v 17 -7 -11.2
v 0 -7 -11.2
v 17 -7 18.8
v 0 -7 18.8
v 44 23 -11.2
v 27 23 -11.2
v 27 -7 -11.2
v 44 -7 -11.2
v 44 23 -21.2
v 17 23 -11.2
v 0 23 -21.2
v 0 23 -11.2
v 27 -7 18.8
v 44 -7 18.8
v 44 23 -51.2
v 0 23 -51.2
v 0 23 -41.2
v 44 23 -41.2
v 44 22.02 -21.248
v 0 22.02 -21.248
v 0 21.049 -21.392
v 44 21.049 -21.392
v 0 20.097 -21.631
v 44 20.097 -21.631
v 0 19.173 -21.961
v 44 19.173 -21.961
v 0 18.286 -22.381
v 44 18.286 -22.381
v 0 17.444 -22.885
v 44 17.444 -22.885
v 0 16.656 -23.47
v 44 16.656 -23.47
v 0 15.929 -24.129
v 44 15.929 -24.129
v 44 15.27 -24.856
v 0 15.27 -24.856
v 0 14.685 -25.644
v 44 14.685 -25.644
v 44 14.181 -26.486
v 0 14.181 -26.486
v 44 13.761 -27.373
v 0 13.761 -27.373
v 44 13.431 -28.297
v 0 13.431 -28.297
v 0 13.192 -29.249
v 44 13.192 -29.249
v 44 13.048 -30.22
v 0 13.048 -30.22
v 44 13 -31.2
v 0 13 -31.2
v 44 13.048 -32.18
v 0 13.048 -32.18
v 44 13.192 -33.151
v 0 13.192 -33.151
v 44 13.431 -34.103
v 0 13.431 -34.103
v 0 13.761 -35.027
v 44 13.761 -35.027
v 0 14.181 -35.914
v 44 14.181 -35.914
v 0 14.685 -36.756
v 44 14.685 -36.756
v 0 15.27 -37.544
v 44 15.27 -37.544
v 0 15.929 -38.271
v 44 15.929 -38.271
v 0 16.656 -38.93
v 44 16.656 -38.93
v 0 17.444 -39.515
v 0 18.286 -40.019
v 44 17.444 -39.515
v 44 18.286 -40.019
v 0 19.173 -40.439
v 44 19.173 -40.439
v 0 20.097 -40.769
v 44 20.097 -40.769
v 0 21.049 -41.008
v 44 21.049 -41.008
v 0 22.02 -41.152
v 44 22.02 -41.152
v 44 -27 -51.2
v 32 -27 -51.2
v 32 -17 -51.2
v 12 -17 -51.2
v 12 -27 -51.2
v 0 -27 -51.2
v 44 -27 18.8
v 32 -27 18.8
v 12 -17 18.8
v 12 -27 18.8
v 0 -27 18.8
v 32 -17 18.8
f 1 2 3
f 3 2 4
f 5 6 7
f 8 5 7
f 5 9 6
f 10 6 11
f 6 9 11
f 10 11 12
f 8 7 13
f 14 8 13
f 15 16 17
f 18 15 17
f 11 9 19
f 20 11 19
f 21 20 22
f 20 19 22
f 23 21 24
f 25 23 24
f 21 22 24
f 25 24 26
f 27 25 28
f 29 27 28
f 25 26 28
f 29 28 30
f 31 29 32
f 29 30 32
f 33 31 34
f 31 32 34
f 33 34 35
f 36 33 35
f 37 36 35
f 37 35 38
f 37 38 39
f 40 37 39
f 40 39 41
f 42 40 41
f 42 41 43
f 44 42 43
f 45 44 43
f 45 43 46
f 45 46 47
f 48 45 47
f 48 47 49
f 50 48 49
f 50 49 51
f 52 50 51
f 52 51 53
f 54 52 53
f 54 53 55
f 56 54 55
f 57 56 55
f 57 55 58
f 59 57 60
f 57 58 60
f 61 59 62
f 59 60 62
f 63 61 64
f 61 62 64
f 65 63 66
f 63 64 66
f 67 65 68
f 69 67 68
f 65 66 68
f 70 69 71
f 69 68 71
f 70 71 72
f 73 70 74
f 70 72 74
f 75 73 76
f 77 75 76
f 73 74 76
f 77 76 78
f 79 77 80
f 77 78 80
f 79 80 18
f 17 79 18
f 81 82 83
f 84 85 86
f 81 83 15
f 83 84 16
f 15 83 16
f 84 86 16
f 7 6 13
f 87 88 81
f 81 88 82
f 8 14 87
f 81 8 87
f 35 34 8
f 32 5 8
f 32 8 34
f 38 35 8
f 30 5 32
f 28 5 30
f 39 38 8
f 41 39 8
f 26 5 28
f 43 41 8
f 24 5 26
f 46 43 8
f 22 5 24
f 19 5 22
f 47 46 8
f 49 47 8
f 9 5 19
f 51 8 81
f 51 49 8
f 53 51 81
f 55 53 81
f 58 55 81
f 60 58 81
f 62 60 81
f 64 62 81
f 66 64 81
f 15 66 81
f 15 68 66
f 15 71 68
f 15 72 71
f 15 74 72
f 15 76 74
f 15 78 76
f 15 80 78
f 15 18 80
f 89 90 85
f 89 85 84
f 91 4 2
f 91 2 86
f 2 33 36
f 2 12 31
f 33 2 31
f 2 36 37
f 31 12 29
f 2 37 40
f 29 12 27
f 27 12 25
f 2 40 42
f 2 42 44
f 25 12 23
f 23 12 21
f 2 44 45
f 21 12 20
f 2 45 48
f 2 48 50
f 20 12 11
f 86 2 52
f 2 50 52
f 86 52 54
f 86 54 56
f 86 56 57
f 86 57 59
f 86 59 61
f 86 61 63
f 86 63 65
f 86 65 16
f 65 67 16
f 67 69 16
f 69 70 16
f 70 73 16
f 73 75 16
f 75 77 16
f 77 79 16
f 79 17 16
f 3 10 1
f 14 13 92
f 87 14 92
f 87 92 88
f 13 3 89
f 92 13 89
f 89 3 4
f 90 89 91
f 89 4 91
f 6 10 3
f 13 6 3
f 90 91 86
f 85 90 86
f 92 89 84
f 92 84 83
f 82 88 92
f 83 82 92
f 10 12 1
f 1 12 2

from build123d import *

# Parameters (mm, degrees)
BOSS_EXTRUDE1_DEPTH = 44
SKETCH2_R           = 10
CUT_EXTRUDE1_DEPTH  = 73.707908786
SKETCH3_W           = 20
SKETCH3_H           = 20
CUT_EXTRUDE2_DEPTH  = 87.977008456
RIB3_REACH          = 63.923
SKETCH4_WALL_W      = 168.272117334
SKETCH4_WALL_H      = 10


with BuildPart() as part:
    # Sketch1 → Boss-Extrude1 (new body)
    with BuildSketch(Plane(origin=(0, 0, 0), x_dir=(0, 0, -1), z_dir=(1, 0, 0))):
        Polygon((-18.8, -7), (-18.8, -27), (51.2, -27), (51.2, 23), (11.2, 23), (11.2, -7), align=None)
    extrude(amount=BOSS_EXTRUDE1_DEPTH)

    # Sketch2 → Cut-Extrude1 (cut, through all)
    with BuildSketch(Plane(origin=(44, 0, 0), x_dir=(0, 0, -1), z_dir=(1, 0, 0))):
        with Locations((31.2, 23)):
            Circle(SKETCH2_R)
    extrude(amount=-CUT_EXTRUDE1_DEPTH, mode=Mode.SUBTRACT)

    # Sketch3 → Cut-Extrude2 (cut, through all)
    with BuildSketch(Plane.XY.offset(18.8)):
        with Locations((22, -27)):
            Rectangle(SKETCH3_W, SKETCH3_H)
    extrude(amount=-CUT_EXTRUDE2_DEPTH, mode=Mode.SUBTRACT)

    # Sketch4 wall → Rib3 (add, up to next)
    with BuildSketch(Plane(origin=(22, 8, 3.8), x_dir=(0, -0.707106781187, 0.707106781187), z_dir=(0, -0.707106781187, -0.707106781187)), mode=Mode.PRIVATE) as rib3_sk1:
        Rectangle(SKETCH4_WALL_W, SKETCH4_WALL_H)
    rib3_tool1 = extrude(rib3_sk1.sketch, amount=RIB3_REACH, mode=Mode.PRIVATE) - part.part
    add(rib3_tool1.solids().sort_by_distance((22, 8, 3.8))[0])


solid = part.part
